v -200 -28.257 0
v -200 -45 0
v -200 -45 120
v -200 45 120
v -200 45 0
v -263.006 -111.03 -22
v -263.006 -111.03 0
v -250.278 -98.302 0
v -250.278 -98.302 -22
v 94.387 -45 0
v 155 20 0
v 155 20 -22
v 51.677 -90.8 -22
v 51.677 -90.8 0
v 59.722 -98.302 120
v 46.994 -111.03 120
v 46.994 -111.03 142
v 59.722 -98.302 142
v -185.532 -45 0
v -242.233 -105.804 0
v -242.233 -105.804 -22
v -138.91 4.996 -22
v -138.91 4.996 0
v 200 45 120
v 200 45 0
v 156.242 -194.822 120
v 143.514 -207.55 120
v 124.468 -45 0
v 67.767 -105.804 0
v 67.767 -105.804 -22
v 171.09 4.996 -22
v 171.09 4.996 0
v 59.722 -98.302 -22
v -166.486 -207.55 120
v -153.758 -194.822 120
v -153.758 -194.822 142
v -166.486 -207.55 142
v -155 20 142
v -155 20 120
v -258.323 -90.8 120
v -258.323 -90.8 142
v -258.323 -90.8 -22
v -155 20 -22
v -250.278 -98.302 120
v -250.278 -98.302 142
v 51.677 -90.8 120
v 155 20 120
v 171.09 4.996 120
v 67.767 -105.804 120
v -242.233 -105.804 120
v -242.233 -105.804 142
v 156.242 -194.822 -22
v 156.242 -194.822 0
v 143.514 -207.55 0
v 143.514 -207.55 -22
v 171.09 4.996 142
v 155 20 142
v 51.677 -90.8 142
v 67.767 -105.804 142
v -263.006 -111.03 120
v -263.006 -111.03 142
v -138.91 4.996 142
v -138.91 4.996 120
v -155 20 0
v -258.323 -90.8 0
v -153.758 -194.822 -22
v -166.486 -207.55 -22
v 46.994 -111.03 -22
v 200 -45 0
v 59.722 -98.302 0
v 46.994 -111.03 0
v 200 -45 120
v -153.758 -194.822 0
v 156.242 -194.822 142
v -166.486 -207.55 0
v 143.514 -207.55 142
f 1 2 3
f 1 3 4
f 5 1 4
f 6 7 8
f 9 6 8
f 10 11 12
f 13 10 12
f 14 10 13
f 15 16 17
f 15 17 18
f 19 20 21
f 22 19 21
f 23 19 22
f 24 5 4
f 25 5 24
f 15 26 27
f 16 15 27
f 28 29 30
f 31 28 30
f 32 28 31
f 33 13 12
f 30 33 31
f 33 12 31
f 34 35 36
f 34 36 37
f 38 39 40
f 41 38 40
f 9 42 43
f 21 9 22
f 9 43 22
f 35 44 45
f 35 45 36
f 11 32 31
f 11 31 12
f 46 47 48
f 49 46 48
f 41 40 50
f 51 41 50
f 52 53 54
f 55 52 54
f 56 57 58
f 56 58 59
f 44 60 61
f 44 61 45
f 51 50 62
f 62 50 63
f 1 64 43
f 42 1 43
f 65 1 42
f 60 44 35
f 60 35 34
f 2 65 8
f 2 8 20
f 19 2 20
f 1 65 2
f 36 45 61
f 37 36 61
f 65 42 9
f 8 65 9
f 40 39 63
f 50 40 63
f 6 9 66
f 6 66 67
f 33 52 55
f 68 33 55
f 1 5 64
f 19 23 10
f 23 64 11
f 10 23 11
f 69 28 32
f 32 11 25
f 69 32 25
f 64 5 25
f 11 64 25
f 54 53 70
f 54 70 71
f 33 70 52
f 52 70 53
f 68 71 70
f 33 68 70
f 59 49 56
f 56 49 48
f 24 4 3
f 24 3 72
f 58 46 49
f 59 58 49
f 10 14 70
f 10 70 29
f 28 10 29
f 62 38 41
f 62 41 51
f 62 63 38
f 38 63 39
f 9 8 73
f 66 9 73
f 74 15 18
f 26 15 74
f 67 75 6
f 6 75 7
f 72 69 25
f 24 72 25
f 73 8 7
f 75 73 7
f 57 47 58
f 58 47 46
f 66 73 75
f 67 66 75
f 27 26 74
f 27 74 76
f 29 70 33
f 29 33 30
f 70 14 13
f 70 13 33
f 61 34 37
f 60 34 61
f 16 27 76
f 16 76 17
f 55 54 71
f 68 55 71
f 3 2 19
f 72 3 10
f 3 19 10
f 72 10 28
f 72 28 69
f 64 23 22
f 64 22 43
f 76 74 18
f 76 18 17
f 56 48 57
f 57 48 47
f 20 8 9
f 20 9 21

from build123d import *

# Parameters (mm, degrees)
SKETCH1_W             = 400
SKETCH1_H             = 90
BOSS_EXTRUDE1_DEPTH   = 120
BOSS_EXTRUDE2_DEPTH   = 22
BOSS_EXTRUDE2_2_DEPTH = 22
BOSS_EXTRUDE2_3_DEPTH = 22
BOSS_EXTRUDE2_4_DEPTH = 22
BOSS_EXTRUDE3_START   = -120
BOSS_EXTRUDE3_DEPTH   = 22


with BuildPart() as part:
    # Sketch1 → Boss-Extrude1 (new body)
    with BuildSketch(Plane.XY):
        Rectangle(SKETCH1_W, SKETCH1_H)
    extrude(amount=BOSS_EXTRUDE1_DEPTH)

    # Sketch2<3> → Boss-Extrude3 (add)
    with BuildSketch(Plane.XY.offset(120).offset(BOSS_EXTRUDE3_START)):
        Polygon((-155, 20), (-258.322751549, -90.800085795), (-242.232970114, -105.804049717), (-138.910218564, 4.996036079), align=None)
        Polygon((155, 20), (51.677248451, -90.800085795), (67.767029886, -105.804049717), (171.089781436, 4.996036079), align=None)
        Polygon((-250.277860832, -98.302067756), (-153.7577852, -194.822143388), (-166.485707261, -207.550065449), (-263.005782893, -111.029989817), align=None)
        Polygon((59.722139168, -98.302067756), (156.2422148, -194.822143388), (143.514292739, -207.550065449), (46.994217107, -111.029989817), align=None)
    extrude(amount=-BOSS_EXTRUDE3_DEPTH)


with BuildPart() as body_2:
    # Sketch2 → Boss-Extrude2 (new body)
    with BuildSketch(Plane.XY.offset(120)):
        Polygon((-155, 20), (-258.322751549, -90.800085795), (-242.232970114, -105.804049717), (-138.910218564, 4.996036079), align=None)
    extrude(amount=BOSS_EXTRUDE2_DEPTH)


with BuildPart() as body_3:
    # Sketch2 → Boss-Extrude2 2 (new body)
    with BuildSketch(Plane.XY.offset(120)):
        Polygon((155, 20), (51.677248451, -90.800085795), (67.767029886, -105.804049717), (171.089781436, 4.996036079), align=None)
    extrude(amount=BOSS_EXTRUDE2_2_DEPTH)


with BuildPart() as body_4:
    # Sketch2 → Boss-Extrude2 3 (new body)
    with BuildSketch(Plane.XY.offset(120)):
        Polygon((-250.277860832, -98.302067756), (-153.7577852, -194.822143388), (-166.485707261, -207.550065449), (-263.005782893, -111.029989817), align=None)
    extrude(amount=BOSS_EXTRUDE2_3_DEPTH)


with BuildPart() as body_5:
    # Sketch2 → Boss-Extrude2 4 (new body)
    with BuildSketch(Plane.XY.offset(120)):
        Polygon((59.722139168, -98.302067756), (156.2422148, -194.822143388), (143.514292739, -207.550065449), (46.994217107, -111.029989817), align=None)
    extrude(amount=BOSS_EXTRUDE2_4_DEPTH)


solid = Compound([part.part, body_2.part, body_3.part, body_4.part, body_5.part])
